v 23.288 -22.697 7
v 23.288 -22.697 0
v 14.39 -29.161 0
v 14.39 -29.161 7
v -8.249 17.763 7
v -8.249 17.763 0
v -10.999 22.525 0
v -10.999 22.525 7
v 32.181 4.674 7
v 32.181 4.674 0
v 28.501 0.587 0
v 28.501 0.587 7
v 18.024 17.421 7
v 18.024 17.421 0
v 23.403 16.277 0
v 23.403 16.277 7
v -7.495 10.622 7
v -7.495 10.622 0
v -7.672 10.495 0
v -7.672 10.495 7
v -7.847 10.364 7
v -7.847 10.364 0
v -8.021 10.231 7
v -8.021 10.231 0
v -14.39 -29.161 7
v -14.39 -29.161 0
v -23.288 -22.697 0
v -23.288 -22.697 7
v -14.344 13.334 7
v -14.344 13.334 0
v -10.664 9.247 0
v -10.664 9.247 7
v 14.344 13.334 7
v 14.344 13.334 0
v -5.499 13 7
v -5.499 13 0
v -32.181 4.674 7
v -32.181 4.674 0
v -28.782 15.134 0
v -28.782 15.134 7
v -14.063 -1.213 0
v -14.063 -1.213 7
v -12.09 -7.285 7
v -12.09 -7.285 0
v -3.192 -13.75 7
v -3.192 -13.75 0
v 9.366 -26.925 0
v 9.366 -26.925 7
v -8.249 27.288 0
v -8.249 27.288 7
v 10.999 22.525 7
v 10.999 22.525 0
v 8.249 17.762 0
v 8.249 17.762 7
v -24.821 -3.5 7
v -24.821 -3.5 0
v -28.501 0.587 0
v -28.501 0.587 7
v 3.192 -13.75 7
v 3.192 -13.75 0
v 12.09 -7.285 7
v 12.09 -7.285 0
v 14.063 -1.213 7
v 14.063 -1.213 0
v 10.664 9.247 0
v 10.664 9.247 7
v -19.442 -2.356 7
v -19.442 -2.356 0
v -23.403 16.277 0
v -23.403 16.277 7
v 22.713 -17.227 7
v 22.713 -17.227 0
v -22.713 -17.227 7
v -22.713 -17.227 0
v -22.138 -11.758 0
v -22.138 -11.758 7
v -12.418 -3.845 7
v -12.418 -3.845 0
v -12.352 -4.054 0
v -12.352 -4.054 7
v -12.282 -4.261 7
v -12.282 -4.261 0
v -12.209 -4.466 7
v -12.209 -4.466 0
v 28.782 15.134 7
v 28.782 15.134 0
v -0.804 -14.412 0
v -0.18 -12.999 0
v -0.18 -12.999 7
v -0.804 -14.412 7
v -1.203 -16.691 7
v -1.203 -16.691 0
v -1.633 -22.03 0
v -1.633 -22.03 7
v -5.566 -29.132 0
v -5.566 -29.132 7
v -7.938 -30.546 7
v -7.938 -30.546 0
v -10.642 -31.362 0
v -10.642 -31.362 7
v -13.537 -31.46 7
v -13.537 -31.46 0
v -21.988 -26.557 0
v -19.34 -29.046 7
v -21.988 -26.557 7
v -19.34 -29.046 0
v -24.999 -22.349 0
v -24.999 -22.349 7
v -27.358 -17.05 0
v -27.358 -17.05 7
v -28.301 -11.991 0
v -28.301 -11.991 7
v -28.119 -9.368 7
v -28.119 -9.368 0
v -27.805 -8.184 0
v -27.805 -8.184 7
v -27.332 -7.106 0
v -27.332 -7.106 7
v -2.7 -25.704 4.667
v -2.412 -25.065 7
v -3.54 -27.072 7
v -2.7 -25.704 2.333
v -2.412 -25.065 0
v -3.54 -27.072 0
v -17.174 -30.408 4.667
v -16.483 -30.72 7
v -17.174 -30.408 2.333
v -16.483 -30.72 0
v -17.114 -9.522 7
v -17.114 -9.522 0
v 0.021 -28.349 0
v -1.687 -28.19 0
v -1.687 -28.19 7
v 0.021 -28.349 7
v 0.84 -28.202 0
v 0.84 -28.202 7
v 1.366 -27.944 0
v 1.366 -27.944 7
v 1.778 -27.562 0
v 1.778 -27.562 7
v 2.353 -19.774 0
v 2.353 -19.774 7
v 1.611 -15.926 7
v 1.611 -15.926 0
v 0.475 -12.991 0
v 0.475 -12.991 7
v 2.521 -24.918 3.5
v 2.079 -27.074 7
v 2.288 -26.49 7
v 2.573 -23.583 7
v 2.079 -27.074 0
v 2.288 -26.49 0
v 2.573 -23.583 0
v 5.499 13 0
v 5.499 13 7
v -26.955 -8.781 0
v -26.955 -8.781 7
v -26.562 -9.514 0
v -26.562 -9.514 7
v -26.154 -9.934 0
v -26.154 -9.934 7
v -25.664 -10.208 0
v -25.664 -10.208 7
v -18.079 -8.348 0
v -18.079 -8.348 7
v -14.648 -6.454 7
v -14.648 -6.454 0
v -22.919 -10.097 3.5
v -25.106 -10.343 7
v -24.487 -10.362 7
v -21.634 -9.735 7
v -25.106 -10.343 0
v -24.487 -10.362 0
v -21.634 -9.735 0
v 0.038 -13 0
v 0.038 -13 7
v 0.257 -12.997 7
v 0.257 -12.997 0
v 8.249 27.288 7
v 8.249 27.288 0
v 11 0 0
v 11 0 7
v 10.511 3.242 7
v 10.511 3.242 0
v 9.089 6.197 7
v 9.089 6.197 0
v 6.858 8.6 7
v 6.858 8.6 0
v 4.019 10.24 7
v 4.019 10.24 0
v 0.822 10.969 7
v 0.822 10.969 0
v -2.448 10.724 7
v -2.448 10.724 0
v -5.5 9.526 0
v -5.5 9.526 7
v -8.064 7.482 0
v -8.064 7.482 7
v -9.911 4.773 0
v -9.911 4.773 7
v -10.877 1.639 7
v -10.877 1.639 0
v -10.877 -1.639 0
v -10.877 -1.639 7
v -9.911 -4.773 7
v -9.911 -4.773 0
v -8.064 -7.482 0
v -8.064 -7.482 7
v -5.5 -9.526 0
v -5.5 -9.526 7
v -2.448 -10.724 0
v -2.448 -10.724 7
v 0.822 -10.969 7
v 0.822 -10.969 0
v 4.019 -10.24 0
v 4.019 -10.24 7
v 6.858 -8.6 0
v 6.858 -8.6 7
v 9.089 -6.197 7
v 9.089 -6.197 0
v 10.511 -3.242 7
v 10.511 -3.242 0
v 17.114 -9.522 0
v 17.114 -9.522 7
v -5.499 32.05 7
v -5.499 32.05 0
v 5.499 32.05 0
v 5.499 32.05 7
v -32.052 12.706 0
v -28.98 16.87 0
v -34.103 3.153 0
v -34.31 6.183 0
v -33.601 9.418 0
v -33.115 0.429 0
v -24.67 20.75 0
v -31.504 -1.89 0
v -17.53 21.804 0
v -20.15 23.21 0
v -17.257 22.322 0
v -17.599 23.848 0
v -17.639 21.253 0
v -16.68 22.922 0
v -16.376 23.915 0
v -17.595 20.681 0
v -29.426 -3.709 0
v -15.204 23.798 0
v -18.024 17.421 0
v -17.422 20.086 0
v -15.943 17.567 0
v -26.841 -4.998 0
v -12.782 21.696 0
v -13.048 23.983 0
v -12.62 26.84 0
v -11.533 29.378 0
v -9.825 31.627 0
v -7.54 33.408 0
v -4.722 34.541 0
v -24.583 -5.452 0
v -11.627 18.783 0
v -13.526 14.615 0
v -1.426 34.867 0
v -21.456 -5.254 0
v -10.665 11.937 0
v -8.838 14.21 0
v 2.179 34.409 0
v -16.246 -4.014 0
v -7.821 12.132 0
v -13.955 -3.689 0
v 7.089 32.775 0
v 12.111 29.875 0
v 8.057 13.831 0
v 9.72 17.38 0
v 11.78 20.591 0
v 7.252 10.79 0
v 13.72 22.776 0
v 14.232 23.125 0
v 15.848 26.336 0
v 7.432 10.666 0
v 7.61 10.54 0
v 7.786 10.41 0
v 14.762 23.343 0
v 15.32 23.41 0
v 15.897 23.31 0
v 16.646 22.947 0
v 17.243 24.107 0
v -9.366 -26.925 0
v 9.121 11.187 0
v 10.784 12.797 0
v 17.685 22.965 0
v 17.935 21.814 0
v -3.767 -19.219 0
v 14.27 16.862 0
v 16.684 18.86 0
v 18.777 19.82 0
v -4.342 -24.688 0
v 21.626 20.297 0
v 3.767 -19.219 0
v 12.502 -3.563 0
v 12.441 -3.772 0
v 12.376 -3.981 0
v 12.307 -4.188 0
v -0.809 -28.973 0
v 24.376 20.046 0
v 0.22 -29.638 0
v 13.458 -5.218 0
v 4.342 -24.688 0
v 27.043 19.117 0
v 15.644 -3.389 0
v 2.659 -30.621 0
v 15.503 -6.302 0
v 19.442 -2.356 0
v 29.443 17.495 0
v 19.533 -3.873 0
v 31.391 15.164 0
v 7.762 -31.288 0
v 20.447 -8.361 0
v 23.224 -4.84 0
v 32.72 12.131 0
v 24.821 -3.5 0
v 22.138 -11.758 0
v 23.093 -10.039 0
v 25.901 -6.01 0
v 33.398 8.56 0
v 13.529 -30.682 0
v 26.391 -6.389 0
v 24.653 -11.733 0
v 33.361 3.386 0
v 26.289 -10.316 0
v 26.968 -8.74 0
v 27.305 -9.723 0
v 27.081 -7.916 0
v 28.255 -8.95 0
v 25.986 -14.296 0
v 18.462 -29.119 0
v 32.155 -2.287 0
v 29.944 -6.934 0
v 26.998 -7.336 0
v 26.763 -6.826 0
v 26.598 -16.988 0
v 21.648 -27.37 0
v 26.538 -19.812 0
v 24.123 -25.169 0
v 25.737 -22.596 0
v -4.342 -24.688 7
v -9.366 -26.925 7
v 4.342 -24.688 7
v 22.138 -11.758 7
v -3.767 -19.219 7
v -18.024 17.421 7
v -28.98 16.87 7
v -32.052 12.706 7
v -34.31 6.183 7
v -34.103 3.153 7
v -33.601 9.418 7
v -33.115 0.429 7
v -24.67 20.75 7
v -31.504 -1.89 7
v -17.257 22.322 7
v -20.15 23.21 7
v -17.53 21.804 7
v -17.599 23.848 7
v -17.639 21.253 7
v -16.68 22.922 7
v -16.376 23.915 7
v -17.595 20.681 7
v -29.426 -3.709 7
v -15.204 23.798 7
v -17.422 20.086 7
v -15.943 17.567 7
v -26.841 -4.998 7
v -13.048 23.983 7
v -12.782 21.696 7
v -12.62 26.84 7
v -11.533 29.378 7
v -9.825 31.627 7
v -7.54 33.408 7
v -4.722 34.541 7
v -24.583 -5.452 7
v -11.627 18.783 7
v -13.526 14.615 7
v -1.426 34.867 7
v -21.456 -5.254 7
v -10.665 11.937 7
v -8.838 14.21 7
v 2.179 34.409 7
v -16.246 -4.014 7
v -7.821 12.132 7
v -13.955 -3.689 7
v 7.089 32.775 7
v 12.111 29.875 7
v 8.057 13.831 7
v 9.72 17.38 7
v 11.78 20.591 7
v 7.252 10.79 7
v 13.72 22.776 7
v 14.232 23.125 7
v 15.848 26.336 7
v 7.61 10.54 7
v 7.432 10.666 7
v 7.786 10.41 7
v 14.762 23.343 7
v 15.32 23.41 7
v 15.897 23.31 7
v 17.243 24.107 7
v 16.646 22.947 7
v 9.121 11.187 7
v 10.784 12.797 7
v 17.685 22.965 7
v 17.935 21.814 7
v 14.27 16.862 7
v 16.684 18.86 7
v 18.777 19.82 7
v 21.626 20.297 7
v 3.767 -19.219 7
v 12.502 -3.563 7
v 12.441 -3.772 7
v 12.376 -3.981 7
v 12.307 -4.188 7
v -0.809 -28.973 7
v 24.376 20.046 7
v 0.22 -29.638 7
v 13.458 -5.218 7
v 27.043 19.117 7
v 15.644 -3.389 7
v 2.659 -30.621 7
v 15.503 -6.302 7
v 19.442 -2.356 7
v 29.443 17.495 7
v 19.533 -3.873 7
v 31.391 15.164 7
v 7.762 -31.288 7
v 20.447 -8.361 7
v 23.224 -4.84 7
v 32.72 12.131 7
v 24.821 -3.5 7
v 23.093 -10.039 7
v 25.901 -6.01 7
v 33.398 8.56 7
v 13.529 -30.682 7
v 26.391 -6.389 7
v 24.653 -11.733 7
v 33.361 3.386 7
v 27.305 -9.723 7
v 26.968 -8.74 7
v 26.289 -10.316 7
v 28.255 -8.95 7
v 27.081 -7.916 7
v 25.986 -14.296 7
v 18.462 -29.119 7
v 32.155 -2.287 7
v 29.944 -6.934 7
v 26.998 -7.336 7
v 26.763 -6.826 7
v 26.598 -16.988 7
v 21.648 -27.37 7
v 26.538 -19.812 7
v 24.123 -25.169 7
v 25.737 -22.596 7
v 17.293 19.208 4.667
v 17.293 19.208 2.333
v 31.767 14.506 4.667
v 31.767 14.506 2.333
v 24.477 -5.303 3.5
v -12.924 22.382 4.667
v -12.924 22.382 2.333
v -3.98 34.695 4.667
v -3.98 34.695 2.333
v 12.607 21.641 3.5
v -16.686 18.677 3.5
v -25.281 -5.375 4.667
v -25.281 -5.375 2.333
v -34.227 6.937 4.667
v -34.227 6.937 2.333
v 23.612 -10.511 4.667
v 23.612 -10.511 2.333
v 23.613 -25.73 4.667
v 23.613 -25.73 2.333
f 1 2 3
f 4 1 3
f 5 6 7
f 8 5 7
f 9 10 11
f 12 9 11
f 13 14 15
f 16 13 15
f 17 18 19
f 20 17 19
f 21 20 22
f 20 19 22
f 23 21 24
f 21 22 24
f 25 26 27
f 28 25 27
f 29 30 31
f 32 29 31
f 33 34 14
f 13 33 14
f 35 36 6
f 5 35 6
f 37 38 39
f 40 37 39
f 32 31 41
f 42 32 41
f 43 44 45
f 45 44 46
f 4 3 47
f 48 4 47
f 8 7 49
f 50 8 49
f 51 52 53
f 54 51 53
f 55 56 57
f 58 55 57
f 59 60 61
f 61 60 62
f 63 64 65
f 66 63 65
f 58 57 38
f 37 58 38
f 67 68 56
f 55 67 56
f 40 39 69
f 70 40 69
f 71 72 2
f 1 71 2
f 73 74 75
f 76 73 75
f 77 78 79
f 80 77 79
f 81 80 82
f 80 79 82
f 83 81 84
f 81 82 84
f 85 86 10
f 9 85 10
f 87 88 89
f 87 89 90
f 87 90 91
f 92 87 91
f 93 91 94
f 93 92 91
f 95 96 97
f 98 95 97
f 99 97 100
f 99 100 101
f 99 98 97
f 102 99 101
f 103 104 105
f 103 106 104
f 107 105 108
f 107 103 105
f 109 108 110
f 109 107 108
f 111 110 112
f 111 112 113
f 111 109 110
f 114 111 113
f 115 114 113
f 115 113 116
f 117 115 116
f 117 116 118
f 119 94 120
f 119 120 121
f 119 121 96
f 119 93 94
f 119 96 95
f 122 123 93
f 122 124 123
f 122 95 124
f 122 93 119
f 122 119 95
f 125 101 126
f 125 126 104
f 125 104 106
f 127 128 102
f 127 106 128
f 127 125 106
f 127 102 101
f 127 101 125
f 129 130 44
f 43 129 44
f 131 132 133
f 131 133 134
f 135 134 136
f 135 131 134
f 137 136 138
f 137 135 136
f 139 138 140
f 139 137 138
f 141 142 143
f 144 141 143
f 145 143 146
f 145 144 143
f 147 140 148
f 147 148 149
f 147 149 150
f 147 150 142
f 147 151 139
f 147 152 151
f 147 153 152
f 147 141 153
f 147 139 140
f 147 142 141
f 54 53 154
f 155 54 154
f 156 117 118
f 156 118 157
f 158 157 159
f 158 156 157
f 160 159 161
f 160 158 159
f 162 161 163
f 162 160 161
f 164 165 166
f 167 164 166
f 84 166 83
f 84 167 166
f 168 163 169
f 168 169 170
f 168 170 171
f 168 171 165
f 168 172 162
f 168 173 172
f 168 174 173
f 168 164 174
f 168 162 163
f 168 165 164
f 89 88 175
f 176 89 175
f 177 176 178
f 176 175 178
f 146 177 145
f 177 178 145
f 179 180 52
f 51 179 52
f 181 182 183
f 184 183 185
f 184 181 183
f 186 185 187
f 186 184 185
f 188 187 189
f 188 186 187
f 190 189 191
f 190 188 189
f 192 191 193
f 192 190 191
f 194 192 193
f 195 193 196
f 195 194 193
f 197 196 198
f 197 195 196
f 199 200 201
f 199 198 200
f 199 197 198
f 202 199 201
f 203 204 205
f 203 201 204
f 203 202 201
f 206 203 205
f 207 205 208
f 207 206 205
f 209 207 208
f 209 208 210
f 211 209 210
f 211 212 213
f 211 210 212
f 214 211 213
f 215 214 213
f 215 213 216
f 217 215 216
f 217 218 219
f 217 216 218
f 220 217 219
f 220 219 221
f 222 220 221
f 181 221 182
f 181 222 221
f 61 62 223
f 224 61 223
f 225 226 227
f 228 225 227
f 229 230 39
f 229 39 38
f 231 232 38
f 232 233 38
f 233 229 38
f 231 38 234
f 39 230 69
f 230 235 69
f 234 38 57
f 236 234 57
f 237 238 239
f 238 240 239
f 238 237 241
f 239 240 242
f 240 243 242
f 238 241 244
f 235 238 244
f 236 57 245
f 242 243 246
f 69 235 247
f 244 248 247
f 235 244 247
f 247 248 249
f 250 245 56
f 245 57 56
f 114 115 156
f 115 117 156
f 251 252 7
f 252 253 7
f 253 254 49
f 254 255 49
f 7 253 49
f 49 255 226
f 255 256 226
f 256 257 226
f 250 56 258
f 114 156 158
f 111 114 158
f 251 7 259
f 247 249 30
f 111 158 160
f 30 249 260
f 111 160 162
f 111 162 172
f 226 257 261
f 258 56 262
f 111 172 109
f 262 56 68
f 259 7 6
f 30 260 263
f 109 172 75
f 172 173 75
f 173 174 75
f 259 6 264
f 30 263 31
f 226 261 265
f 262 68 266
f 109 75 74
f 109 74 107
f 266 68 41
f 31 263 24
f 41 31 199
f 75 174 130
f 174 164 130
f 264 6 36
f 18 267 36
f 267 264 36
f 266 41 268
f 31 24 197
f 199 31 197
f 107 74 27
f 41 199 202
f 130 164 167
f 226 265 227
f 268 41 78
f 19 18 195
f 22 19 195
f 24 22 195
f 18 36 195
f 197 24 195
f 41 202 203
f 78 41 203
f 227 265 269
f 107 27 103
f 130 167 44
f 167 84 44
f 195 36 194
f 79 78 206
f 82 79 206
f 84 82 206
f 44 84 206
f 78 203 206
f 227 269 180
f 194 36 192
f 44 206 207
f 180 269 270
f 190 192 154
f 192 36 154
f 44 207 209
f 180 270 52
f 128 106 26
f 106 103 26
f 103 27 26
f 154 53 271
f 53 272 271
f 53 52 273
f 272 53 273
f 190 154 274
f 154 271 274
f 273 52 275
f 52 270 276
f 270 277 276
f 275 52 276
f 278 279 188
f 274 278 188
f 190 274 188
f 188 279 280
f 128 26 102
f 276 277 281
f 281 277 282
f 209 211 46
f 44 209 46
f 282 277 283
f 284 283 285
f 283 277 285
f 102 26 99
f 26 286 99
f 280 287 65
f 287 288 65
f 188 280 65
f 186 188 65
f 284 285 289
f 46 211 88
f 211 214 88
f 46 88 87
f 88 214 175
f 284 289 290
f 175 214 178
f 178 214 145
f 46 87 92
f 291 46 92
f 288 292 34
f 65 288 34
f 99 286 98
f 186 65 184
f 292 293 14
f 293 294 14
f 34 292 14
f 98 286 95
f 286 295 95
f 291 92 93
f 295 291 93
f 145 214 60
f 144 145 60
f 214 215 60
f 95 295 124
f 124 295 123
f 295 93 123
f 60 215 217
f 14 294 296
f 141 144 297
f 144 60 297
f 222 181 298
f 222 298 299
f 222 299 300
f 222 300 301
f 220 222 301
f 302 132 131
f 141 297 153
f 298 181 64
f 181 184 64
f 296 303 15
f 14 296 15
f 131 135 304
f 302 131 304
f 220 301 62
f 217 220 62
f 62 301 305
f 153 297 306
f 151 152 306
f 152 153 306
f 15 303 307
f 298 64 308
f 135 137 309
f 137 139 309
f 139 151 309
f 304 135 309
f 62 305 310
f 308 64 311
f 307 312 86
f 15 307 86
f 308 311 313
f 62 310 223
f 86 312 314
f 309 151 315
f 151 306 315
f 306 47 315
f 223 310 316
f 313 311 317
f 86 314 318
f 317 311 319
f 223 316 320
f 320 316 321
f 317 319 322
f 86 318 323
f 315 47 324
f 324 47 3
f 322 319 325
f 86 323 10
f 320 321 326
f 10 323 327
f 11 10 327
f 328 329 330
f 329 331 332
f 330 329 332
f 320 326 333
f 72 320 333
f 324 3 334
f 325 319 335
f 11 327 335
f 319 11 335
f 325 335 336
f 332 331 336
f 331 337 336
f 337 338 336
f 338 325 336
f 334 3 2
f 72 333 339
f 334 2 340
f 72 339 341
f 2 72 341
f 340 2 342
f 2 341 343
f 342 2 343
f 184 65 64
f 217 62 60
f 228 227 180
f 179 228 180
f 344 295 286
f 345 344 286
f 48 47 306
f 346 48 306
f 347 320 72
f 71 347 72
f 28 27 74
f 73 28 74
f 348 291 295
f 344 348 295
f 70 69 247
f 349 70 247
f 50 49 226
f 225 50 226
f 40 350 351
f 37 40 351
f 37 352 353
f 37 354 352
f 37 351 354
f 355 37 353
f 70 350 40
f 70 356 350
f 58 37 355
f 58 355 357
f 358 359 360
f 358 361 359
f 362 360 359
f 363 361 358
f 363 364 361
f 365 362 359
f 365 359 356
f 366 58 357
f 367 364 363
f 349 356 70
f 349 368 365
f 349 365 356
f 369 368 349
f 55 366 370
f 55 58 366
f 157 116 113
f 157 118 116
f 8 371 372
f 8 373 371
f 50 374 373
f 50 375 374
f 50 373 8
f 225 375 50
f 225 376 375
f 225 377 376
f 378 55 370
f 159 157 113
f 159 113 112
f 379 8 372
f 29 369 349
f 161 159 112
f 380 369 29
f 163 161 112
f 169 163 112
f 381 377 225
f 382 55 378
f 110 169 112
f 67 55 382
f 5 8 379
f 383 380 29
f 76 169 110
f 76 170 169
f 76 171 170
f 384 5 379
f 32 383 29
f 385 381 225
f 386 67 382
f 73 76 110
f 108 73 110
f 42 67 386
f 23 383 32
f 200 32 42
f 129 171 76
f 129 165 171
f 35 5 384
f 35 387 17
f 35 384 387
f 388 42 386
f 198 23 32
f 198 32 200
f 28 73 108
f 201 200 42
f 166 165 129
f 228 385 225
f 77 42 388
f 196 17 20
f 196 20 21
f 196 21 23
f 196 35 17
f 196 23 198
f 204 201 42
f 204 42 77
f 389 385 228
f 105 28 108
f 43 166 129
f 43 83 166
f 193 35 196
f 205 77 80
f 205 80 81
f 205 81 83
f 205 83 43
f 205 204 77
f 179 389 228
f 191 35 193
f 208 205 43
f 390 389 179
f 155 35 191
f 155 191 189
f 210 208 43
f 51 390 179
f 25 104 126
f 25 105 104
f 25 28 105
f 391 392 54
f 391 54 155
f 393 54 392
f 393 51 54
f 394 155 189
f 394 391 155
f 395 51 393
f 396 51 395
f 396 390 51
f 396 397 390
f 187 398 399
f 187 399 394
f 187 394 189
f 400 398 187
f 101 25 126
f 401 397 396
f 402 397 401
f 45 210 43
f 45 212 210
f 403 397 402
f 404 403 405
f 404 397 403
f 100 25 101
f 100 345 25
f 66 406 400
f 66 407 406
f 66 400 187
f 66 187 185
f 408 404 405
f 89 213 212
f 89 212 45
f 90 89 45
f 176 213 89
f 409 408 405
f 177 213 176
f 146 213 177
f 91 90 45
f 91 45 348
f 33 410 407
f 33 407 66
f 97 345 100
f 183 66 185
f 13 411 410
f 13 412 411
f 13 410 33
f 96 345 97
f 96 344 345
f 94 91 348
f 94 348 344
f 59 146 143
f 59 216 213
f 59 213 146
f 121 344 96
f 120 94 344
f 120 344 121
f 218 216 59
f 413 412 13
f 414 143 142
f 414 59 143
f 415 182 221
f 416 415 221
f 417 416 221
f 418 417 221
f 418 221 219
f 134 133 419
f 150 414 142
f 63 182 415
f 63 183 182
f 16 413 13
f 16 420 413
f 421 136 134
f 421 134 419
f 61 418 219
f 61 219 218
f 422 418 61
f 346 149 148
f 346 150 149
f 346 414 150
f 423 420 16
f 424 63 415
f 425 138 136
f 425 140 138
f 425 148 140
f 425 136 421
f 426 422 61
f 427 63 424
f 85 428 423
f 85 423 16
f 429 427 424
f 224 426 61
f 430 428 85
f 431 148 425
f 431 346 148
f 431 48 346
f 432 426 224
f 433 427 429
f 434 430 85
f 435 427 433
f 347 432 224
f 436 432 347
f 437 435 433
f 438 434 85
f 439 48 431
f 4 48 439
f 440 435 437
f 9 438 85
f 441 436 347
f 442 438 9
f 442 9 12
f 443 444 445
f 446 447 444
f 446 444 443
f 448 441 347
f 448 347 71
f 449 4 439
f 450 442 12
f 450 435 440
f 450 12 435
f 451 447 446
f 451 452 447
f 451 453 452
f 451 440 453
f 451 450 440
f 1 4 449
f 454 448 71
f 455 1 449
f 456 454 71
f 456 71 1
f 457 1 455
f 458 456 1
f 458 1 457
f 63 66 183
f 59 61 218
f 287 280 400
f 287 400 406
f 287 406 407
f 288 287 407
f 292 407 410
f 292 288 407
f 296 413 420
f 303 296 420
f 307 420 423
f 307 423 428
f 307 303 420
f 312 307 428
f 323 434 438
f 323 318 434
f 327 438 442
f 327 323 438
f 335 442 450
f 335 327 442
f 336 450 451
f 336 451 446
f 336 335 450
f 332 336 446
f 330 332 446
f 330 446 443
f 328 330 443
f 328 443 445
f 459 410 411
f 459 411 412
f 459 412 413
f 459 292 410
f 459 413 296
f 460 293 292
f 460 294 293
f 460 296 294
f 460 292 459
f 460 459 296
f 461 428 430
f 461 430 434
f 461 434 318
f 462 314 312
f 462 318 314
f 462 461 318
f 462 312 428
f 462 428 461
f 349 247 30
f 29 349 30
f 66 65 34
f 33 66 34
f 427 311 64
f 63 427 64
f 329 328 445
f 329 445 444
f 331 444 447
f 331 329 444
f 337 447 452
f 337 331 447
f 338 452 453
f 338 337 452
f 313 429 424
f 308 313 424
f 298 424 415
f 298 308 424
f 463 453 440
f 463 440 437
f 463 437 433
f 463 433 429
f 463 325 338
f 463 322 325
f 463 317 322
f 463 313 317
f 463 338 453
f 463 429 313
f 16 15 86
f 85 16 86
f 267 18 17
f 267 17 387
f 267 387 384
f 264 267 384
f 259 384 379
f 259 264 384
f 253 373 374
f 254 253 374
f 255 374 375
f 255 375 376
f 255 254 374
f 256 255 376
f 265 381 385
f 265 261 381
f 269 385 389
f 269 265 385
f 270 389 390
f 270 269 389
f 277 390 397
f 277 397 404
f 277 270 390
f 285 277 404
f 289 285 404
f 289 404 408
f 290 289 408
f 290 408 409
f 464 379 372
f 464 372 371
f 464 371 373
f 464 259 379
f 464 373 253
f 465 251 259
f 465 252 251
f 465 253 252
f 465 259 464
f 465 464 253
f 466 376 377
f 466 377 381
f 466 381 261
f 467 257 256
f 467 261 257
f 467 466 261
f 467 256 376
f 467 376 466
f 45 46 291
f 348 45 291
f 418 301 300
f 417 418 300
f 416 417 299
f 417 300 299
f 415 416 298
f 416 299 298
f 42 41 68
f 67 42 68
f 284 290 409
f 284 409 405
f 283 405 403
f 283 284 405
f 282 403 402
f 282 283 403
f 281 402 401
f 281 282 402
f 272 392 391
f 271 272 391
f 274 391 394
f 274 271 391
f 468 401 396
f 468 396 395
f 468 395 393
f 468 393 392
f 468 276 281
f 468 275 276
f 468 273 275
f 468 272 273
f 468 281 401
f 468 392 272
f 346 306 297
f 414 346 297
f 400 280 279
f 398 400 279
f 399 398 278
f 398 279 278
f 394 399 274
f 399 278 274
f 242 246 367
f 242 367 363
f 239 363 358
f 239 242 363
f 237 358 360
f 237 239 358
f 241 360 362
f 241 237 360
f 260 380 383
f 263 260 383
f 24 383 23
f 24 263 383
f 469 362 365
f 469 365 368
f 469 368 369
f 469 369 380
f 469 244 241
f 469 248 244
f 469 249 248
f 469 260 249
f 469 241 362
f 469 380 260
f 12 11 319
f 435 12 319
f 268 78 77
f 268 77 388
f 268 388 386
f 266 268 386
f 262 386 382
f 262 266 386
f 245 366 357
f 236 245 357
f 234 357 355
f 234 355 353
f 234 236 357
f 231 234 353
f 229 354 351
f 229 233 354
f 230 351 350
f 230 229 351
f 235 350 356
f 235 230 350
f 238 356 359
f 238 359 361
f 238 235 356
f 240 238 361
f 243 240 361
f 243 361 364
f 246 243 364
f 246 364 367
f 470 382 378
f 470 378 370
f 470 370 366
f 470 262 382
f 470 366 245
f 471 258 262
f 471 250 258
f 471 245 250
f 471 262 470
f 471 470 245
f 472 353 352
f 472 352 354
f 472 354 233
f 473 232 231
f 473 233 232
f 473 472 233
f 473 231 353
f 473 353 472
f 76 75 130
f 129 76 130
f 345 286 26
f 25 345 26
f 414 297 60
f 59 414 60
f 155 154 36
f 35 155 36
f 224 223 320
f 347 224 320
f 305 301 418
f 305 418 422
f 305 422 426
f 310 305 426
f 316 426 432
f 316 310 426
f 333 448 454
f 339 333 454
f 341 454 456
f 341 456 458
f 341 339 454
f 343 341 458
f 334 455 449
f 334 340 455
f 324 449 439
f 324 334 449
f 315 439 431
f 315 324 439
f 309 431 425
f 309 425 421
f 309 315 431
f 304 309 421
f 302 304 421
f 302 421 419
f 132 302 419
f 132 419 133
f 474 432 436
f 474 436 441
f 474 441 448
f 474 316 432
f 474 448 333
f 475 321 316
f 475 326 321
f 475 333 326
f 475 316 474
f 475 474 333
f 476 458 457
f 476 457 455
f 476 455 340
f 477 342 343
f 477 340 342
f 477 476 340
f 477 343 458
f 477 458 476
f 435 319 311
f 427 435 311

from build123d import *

# Parameters (mm, degrees)
F0_R     = 11
F1_DEPTH = 7
F2_COUNT = 5


with BuildPart() as f1:
    # F0 (on Top) → F1 (new body)
    with BuildSketch(Plane.XY):
        with BuildLine():
            ThreePointArc((0, 13), (3.7905348907, 12.4351053571), (7.2516462654, 10.7895146527))
            add(Edge.make_bspline(
                [(17.9348975709, 21.8143326287), (15.5501263216, 24.4103763252), (12.02569754, 22.0389403249), (7.6782712302, 14.1523831855), (7.2516462654, 10.7895146527)],
                knots=[0, 0, 0, 0, 0.3989378216, 1, 1, 1, 1], degree=3))
            add(Edge.make_bspline(
                [(-7.4946351981, 10.6221675399), (-7.6877982356, 14.0730245039), (-16.9816558278, 21.7050431862), (-5.7752638848, 41.6182972459), (17.0080556558, 28.9518470832), (17.9348975709, 21.8143326287)],
                knots=[0, 0, 0, 0, 0.2869603255, 0.5980055899, 1, 1, 1, 1], degree=3))
            ThreePointArc((-7.4946351981, 10.6221675399), (-3.9314006398, 12.3912908532), (0, 13))
        make_face()
        Polygon((5.499261314, 13), (0, 13), (-5.499261314, 13), (-8.2488920963, 17.7625002169), (-10.9985226281, 22.525), (-8.24889179, 27.2875003136), (-5.499261314, 32.05), (0, 32.05), (5.499261314, 32.05), (8.2488918485, 27.2875002122), (10.9985226281, 22.525), (8.248891917, 17.7624999064), align=None, mode=Mode.SUBTRACT)
        with BuildLine():
            ThreePointArc((-7.4946351981, 10.6221675399), (-5.982045738, -11.5418858419), (13, 0))
            ThreePointArc((13, 0), (11.4732602483, 6.1126343973), (7.2516462654, 10.7895146527))
            ThreePointArc((7.2516462654, 10.7895146527), (3.7905348907, 12.4351053571), (0, 13))
            ThreePointArc((0, 13), (-3.9314006398, 12.3912908532), (-7.4946351981, 10.6221675399))
        make_face()
        Circle(F0_R, mode=Mode.SUBTRACT)
    extrude(amount=F1_DEPTH)

    # F2: F1 ×5 about axis
    f2_axis = Axis((0, 0, 7), (0, 0, 1))


with BuildPart() as f1_1:
    add(f1.part)
    for i in range(1, F2_COUNT):
        add(f1.part.rotate(f2_axis, i * 360 / F2_COUNT))


solid = f1_1.part
